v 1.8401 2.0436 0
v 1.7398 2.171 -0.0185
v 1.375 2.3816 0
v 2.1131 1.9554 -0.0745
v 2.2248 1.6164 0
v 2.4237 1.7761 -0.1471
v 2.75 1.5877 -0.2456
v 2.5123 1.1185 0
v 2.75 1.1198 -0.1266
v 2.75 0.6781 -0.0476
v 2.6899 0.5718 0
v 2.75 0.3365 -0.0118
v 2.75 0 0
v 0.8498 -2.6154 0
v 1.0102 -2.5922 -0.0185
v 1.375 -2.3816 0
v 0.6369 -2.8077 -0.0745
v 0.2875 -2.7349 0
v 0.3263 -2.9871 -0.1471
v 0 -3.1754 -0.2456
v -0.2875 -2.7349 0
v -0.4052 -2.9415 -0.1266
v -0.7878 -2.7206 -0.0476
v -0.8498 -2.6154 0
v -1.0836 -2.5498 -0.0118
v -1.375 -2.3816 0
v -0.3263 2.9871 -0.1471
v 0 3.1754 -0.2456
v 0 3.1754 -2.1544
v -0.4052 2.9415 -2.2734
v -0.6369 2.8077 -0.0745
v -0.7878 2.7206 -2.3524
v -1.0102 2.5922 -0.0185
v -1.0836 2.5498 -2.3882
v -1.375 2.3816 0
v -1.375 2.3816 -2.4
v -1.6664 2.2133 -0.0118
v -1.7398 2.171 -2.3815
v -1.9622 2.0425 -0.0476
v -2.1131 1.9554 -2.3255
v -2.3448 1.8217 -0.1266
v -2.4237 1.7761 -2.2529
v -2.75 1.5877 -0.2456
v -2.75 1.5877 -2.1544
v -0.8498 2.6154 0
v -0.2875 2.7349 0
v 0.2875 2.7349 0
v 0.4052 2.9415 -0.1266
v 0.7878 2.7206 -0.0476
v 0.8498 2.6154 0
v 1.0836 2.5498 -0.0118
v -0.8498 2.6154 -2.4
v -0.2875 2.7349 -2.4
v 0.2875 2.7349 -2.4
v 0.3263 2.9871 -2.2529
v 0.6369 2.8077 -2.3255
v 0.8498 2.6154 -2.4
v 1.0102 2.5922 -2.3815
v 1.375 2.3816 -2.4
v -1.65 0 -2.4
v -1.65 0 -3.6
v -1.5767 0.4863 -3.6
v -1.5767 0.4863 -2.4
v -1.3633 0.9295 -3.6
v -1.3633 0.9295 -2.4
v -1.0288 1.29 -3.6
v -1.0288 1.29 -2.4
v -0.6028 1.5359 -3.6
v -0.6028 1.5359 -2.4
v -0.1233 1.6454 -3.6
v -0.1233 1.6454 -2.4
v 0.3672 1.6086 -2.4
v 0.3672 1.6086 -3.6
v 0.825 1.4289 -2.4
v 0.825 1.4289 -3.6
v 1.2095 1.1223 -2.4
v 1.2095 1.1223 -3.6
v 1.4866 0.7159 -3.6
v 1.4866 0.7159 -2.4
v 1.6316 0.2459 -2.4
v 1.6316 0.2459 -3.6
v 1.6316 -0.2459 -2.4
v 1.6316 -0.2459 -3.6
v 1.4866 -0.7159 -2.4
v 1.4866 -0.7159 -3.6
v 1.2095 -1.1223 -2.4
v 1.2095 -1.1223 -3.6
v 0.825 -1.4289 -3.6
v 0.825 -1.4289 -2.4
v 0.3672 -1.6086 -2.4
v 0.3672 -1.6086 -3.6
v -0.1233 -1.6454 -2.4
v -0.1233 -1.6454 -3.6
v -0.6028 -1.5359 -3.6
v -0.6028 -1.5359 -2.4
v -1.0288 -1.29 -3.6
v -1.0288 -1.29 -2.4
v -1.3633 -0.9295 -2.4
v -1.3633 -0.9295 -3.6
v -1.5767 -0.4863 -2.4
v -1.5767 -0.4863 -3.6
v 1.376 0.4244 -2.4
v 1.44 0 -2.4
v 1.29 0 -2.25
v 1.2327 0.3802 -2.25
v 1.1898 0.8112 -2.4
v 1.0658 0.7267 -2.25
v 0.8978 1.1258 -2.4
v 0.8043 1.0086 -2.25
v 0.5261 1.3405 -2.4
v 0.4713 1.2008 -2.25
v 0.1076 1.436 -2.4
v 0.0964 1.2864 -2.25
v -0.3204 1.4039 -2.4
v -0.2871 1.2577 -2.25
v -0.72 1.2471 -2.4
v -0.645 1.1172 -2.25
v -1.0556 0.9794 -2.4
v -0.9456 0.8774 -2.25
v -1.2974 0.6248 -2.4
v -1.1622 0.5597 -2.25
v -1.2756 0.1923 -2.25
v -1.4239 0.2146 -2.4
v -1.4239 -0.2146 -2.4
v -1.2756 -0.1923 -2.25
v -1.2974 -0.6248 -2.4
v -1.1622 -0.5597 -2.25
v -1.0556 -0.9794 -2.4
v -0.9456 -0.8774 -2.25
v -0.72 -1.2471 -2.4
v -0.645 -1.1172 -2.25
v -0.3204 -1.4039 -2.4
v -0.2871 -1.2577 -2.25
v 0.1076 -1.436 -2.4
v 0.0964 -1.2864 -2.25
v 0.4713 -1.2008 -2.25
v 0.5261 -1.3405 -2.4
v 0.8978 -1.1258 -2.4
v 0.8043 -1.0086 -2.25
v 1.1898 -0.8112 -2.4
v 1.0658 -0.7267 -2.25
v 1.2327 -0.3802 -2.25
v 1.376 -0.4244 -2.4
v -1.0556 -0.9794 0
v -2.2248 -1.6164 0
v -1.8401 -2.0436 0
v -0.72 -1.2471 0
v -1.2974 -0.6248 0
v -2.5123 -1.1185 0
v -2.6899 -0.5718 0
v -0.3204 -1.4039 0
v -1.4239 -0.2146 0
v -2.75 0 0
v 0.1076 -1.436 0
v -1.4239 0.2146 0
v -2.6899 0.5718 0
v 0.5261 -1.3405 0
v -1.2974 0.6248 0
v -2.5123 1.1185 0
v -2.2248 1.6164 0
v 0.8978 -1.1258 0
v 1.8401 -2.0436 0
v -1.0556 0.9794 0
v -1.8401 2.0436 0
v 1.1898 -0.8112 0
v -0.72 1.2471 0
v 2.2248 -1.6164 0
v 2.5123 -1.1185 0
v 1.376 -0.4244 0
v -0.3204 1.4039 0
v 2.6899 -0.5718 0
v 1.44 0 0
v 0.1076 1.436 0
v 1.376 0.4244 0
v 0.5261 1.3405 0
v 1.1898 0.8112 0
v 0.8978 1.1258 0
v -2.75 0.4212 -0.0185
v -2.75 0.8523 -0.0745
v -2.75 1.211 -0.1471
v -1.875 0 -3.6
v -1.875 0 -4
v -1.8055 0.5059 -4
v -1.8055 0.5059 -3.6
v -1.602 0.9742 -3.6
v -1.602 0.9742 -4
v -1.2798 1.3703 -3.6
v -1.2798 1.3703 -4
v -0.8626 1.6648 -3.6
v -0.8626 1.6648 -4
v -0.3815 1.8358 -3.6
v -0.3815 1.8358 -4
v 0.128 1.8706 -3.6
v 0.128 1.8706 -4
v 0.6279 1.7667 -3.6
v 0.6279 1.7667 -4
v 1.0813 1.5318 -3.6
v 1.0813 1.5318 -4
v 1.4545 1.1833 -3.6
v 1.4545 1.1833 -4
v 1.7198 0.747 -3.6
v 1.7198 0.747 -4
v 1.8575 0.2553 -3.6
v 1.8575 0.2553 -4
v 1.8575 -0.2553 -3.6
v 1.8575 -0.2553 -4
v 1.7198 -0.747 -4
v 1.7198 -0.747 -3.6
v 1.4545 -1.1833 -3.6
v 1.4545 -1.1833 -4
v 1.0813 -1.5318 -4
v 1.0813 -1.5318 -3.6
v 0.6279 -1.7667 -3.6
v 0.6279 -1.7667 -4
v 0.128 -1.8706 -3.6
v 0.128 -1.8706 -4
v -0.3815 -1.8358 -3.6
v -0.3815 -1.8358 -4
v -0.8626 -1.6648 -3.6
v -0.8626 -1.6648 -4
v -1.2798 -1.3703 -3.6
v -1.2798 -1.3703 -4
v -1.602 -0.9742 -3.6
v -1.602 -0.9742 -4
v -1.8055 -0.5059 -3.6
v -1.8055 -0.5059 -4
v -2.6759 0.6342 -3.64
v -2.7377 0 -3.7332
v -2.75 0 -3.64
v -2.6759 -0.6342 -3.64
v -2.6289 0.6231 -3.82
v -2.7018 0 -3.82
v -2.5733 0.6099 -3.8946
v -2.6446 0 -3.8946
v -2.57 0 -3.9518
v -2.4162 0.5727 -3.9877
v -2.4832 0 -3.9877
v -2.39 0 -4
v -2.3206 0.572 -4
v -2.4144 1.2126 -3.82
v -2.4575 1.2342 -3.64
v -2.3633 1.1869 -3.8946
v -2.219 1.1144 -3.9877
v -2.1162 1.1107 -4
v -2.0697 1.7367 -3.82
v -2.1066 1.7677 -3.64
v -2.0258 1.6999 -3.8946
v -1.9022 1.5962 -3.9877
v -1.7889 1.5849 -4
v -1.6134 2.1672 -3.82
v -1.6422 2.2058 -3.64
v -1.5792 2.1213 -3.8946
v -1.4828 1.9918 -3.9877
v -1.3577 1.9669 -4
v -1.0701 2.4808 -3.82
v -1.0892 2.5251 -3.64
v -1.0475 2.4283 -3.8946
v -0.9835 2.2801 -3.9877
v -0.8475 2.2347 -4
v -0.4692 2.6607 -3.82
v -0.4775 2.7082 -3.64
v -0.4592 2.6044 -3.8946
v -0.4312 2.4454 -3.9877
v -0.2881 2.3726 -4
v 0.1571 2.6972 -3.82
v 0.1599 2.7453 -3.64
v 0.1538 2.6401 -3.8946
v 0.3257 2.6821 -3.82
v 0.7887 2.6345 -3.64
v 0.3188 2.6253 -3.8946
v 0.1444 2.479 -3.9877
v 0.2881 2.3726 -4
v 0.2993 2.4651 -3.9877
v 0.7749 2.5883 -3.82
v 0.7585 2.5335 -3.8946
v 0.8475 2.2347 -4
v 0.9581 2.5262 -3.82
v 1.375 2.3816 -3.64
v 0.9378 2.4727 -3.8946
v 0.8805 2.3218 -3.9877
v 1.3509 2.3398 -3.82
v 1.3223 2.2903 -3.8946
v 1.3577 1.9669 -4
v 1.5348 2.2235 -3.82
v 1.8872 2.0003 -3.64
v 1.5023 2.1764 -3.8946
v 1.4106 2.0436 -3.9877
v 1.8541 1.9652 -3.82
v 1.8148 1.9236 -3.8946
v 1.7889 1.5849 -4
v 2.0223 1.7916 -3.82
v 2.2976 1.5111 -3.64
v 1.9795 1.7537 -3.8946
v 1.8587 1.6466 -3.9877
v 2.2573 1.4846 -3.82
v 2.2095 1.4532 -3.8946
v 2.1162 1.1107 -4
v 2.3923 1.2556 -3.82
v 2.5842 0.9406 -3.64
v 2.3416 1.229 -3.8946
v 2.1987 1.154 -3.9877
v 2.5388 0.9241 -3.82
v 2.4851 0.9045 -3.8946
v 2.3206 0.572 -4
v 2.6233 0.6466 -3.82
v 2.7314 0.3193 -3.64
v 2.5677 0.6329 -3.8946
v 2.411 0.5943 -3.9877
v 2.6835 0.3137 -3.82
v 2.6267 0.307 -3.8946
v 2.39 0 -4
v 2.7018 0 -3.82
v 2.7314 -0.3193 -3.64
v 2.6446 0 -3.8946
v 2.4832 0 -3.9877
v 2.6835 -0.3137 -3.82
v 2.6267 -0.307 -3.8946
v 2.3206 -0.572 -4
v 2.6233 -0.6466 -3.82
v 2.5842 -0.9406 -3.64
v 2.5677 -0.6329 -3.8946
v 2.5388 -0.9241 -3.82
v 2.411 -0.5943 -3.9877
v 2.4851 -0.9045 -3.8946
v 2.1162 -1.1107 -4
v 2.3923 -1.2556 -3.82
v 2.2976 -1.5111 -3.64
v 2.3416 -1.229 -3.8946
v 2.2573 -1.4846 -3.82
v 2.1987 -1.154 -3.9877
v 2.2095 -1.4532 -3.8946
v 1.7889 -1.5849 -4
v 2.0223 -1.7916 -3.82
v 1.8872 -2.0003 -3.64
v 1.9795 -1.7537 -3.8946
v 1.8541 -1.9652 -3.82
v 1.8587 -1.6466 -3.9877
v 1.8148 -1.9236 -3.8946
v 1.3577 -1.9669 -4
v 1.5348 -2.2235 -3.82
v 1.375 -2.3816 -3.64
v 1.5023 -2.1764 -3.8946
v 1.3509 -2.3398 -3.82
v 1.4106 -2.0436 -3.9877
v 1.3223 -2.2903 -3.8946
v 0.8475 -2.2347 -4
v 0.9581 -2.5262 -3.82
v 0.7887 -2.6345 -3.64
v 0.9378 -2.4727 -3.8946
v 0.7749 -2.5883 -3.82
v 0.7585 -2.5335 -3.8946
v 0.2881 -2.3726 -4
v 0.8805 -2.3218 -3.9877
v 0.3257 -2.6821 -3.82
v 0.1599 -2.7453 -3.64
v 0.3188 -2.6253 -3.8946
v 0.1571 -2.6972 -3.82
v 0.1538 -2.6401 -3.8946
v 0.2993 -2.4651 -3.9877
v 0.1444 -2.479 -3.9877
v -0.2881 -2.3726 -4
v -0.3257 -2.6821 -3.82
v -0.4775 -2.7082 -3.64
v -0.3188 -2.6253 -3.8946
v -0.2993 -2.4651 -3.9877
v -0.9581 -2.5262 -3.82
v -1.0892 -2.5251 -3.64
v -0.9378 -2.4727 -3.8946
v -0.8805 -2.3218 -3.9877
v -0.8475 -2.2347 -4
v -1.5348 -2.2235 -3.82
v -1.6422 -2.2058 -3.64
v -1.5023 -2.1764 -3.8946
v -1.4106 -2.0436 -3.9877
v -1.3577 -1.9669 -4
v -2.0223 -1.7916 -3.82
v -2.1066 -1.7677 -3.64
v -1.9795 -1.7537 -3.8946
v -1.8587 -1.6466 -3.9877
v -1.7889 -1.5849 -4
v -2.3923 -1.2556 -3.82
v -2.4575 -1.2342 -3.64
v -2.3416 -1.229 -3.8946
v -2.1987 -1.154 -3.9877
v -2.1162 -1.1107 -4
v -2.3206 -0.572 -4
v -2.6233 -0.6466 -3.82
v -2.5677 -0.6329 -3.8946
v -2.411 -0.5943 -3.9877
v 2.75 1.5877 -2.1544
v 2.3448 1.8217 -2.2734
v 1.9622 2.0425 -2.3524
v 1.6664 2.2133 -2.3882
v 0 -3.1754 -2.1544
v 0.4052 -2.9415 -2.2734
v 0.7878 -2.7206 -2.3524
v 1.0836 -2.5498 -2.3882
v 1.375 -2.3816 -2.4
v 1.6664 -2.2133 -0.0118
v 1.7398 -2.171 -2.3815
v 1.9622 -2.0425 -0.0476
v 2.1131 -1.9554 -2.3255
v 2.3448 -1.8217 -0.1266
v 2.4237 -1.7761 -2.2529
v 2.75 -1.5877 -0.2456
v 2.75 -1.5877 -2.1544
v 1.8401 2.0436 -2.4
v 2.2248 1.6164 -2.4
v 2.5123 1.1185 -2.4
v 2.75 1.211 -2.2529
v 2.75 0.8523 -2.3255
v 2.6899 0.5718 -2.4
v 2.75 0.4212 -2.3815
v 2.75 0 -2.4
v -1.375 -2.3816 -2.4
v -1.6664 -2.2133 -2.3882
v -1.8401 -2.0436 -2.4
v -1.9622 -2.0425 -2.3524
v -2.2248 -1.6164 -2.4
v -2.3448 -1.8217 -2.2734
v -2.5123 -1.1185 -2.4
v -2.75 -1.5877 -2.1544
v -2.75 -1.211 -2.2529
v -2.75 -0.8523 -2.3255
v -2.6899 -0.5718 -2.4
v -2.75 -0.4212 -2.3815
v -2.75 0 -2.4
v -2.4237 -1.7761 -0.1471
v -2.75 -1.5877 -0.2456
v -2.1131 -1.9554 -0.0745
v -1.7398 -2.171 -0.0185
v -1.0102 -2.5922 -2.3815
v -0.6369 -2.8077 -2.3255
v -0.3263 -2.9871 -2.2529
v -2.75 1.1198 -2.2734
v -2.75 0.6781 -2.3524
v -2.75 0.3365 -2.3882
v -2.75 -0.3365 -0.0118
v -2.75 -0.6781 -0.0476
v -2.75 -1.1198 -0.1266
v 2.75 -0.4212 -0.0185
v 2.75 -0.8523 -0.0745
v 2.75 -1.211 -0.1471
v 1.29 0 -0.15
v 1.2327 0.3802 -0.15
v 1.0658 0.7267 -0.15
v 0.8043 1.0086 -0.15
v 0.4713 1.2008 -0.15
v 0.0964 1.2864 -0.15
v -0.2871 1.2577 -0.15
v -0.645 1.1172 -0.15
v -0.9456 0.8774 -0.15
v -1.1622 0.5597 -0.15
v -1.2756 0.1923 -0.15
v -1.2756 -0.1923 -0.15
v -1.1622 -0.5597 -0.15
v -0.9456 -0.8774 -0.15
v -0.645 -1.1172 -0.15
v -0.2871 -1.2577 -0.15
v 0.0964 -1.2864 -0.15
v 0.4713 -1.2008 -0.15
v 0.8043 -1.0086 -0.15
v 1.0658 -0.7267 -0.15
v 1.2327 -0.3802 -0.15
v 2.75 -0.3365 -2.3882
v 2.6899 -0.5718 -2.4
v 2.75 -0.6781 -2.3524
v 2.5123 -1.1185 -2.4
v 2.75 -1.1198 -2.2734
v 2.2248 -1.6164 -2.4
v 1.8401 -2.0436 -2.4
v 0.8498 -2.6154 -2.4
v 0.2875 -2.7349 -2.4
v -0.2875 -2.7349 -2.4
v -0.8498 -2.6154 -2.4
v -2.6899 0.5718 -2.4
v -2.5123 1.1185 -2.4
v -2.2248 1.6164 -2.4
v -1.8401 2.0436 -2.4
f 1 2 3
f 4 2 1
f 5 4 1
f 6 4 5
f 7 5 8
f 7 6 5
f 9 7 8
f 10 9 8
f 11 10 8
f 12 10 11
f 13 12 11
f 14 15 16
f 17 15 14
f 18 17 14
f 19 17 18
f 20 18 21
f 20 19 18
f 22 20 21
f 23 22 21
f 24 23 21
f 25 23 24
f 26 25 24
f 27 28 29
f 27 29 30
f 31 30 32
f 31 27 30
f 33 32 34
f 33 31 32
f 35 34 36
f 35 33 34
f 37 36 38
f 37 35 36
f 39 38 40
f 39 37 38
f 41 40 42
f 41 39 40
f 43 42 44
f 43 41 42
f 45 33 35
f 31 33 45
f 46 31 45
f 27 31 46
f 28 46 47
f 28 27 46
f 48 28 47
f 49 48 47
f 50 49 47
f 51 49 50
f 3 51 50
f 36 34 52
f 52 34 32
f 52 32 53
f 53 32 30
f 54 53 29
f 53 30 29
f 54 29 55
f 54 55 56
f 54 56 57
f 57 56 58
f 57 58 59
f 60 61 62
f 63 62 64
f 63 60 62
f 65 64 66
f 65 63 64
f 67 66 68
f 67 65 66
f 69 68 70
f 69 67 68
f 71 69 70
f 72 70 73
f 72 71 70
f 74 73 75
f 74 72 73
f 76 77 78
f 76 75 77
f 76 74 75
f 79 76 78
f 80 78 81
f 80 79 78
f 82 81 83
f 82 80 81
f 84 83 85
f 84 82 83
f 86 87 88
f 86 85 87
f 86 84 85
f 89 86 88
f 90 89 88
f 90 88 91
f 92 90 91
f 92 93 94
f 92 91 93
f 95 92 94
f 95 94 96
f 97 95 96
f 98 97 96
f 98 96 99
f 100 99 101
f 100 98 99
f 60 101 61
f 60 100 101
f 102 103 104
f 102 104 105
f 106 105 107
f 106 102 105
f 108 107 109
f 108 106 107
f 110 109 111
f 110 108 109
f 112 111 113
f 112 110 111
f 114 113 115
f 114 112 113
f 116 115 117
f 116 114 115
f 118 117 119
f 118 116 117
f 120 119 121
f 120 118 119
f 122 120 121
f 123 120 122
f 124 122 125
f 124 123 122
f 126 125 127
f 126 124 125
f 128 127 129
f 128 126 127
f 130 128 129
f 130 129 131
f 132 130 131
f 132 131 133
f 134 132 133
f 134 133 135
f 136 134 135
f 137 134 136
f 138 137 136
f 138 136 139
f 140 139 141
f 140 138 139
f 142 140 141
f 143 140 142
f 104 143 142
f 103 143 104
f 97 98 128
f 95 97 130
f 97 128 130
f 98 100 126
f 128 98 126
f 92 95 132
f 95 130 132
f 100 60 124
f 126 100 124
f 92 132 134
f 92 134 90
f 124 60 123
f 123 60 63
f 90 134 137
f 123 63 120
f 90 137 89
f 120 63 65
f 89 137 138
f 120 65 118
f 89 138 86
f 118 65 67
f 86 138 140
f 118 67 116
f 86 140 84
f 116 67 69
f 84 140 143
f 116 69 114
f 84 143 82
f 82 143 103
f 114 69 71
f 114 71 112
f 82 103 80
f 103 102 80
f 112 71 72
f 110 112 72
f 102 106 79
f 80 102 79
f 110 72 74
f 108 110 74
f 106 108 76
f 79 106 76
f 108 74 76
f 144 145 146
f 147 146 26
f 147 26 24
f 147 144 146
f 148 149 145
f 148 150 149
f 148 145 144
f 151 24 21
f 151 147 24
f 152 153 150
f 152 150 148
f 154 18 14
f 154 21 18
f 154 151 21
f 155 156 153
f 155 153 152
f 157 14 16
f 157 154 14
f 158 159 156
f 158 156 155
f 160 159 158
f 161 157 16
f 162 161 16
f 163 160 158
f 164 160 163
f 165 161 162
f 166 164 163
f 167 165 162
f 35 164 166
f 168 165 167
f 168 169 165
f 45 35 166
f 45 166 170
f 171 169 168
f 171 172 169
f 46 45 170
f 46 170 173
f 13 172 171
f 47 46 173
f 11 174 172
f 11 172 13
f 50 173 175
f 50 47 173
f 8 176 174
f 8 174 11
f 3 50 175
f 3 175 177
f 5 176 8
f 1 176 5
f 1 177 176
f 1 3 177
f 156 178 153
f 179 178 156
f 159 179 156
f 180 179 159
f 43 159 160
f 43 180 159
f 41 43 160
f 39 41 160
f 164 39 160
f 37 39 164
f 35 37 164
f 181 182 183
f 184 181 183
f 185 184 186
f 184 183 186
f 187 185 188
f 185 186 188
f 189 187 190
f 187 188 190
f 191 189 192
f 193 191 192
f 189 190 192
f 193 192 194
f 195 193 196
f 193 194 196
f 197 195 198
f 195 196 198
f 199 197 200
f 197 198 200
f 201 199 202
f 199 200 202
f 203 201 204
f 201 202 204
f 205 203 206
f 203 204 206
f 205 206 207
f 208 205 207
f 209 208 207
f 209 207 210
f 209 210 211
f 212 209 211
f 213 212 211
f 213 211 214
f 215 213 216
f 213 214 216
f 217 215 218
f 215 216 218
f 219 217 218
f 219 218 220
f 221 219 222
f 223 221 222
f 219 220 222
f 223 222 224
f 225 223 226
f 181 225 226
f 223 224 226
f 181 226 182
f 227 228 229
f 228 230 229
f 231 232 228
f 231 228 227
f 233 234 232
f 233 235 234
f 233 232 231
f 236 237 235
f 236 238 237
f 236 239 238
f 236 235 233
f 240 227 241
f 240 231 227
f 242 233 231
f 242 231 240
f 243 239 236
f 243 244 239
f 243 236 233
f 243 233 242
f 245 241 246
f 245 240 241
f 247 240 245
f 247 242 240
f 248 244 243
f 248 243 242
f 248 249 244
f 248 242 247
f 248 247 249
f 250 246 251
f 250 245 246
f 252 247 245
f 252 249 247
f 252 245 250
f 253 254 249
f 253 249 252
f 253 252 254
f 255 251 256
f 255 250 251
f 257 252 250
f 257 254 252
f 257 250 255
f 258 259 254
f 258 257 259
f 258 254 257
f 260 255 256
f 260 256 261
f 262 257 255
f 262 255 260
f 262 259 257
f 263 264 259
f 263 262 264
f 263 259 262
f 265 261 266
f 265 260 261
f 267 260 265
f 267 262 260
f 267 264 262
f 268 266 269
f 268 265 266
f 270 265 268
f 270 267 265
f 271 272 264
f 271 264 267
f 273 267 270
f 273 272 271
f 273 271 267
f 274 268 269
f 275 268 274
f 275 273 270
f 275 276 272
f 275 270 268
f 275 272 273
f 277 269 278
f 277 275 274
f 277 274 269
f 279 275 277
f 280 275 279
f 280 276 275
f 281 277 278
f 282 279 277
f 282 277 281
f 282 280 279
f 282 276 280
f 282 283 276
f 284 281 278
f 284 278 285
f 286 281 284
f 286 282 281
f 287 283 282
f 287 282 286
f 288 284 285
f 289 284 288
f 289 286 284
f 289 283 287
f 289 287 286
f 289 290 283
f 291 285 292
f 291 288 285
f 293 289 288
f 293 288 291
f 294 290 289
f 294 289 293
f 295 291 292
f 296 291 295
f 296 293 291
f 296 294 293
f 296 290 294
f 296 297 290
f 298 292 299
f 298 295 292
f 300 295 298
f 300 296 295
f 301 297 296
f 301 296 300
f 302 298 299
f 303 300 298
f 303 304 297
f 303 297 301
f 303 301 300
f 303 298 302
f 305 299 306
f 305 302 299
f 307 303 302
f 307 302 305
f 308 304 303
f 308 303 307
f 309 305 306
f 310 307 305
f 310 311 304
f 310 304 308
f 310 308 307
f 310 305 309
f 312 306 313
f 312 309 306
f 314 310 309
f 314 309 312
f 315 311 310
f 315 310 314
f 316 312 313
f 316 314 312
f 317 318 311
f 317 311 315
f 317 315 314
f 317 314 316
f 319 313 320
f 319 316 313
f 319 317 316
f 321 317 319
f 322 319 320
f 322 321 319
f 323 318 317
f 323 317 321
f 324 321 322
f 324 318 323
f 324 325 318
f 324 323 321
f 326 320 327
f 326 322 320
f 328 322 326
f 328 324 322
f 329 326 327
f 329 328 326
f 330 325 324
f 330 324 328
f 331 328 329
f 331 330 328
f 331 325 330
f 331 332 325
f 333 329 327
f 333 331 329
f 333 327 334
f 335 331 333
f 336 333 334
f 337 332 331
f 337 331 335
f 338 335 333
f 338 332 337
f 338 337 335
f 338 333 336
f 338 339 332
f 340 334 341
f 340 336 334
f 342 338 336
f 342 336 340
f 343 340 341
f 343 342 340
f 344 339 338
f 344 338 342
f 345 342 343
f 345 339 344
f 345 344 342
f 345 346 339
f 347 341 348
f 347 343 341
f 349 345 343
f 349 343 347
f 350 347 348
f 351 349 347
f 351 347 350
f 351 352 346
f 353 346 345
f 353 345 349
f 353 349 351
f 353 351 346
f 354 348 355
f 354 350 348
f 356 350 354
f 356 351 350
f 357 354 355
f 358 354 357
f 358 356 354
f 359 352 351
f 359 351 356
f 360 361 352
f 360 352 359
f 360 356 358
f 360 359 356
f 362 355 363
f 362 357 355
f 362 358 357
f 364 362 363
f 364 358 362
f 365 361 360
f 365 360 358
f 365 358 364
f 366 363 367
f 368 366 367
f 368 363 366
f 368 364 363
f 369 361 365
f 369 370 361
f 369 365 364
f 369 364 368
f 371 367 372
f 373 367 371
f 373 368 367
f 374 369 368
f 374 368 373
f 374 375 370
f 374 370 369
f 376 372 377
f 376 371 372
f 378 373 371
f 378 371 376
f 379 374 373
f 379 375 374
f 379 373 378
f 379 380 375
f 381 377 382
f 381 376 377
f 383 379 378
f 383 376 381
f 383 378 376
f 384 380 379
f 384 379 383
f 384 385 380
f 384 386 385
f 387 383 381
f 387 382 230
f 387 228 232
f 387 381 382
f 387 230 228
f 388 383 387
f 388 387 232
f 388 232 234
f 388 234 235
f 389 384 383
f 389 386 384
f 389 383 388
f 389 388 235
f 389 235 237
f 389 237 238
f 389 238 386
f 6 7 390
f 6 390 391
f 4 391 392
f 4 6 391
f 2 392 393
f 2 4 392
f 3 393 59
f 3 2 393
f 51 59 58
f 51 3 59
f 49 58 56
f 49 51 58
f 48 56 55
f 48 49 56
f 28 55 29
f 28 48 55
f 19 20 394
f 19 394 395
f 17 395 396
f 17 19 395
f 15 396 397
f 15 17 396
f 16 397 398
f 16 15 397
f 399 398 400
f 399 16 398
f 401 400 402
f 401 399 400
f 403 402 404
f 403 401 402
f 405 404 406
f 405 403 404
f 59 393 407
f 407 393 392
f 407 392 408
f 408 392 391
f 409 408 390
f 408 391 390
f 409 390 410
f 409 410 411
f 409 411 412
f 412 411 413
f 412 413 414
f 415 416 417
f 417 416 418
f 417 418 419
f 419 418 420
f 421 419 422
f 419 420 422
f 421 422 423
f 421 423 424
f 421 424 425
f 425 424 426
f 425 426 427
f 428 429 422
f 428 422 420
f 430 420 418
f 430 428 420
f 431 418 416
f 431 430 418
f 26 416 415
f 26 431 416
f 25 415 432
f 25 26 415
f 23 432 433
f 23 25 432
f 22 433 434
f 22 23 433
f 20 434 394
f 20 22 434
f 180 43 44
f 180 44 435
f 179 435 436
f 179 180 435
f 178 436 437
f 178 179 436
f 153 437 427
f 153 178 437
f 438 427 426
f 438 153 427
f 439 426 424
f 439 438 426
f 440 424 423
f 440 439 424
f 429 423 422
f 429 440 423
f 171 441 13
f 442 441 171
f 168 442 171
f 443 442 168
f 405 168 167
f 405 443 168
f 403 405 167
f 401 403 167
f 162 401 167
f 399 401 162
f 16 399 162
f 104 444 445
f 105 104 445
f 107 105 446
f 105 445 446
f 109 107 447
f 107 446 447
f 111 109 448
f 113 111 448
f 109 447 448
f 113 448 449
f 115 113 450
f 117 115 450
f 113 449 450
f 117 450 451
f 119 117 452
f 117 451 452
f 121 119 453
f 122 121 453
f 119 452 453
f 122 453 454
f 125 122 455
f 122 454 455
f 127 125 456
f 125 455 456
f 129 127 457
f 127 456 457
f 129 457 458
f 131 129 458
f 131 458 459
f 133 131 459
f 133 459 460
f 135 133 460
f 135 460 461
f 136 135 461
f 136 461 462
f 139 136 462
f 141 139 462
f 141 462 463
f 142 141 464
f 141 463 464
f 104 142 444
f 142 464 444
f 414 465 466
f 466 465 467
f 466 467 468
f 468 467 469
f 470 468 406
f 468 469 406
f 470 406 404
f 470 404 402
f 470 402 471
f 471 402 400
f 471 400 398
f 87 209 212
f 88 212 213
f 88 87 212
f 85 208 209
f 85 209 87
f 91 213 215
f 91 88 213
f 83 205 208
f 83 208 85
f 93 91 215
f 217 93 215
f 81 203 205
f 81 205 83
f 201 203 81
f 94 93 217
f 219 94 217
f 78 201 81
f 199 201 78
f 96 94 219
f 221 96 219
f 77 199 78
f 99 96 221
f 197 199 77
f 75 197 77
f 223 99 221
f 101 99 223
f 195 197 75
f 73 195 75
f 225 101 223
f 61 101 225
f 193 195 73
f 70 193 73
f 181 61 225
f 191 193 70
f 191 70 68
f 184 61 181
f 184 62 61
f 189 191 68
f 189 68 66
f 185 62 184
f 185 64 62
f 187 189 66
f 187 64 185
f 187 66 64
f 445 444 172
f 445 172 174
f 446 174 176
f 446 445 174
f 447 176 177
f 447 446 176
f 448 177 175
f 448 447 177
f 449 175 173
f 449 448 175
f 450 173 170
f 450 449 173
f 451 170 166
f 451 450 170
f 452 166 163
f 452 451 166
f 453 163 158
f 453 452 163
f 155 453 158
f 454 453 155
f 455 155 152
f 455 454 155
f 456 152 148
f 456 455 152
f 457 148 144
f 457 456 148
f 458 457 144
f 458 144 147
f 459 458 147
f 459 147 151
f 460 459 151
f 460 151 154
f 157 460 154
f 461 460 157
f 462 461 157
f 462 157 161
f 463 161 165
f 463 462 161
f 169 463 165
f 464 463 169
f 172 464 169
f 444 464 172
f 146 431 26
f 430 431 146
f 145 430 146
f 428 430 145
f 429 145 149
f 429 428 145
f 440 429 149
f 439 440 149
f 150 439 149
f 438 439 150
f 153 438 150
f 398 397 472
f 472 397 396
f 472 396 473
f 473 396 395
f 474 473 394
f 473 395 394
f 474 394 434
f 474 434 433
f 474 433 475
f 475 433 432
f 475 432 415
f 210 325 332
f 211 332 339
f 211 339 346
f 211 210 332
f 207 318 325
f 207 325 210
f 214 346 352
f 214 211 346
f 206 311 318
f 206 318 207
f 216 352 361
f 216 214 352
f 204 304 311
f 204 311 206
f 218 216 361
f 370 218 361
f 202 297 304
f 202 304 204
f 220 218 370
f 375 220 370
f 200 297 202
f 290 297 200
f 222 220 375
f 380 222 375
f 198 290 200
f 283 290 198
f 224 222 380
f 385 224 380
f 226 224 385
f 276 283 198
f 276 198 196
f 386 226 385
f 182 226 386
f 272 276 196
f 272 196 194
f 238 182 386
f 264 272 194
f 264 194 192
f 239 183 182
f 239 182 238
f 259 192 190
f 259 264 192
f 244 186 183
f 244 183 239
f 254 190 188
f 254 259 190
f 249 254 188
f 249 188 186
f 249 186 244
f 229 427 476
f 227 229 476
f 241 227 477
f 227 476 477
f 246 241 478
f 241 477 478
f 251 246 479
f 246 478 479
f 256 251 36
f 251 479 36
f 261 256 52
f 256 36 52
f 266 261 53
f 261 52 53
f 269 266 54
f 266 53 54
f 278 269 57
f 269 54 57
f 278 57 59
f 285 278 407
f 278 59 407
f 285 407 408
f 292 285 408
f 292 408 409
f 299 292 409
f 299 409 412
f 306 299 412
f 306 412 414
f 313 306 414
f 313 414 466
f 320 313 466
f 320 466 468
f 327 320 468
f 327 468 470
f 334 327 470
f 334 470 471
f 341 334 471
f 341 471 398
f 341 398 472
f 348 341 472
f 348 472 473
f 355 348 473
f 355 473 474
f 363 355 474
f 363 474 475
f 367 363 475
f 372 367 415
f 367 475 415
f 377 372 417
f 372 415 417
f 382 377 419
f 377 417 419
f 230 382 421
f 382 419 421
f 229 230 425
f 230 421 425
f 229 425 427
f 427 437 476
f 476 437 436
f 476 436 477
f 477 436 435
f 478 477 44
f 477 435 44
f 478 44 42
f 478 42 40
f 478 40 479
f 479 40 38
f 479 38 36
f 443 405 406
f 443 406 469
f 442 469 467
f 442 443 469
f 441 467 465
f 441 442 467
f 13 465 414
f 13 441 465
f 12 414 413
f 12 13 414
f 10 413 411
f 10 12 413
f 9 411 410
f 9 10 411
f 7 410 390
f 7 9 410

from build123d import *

# Parameters (mm, degrees)
SKETCH_1_R          = 1.29
EXTRUDE_1_DEPTH     = 2.4
SKETCH_5_R          = 2.75
SKETCH_5_R_2        = 1.65
EXTRUDE_4_DEPTH     = 1.6
FILLET_2_R          = 0.36
SKETCH_6_R          = 1.875
CUT_EXTRUDE_1_DEPTH = 0.4
CHAMFER_2_SIZE      = 0.15


with BuildPart() as part:
    # 草图1 → 凸台-拉伸1 (new body)
    with BuildSketch(Plane.XY):
        Polygon((0, 3.175426481), (-2.75, 1.58771324), (-2.75, -1.58771324), (0, -3.175426481), (2.75, -1.58771324), (2.75, 1.58771324), align=None)
        Circle(SKETCH_1_R, mode=Mode.SUBTRACT)
    extrude(amount=-EXTRUDE_1_DEPTH)

    # 草图2 → 切除-旋转1 (revolve, cut)
    with BuildSketch(Plane(origin=(0, 0, 0), x_dir=(0, 0, -1), z_dir=(1, 0, 0))):
        Polygon((0, 2.75), (0.245620093, 3.175426481), (0, 3.175426481), align=None)
        Polygon((2.4, 2.75), (2.154379907, 3.175426481), (2.4, 3.175426481), align=None)
    revolve(axis=Axis((0, 0, 0), (0, 0, -1)), mode=Mode.SUBTRACT)

    # 草图5 → 凸台-拉伸4 (add)
    with BuildSketch(Plane(origin=(0, 0, -2.4), x_dir=(-1, 0, 0), z_dir=(0, 0, -1))):
        Circle(SKETCH_5_R)
        Circle(SKETCH_5_R_2, mode=Mode.SUBTRACT)
    extrude(amount=EXTRUDE_4_DEPTH)

    # 圆角2
    fillet_2_edges = [part.edges().sort_by_distance(p)[0] for p in [
        (2.75, 0, -4),
    ]]
    fillet(fillet_2_edges, radius=FILLET_2_R)

    # 草图6 → 切除-拉伸1 (cut)
    with BuildSketch(Plane(origin=(0, 0, -4), x_dir=(-1, 0, 0), z_dir=(0, 0, -1))):
        Circle(SKETCH_6_R)
    extrude(amount=-CUT_EXTRUDE_1_DEPTH, mode=Mode.SUBTRACT)

    # 倒角2
    chamfer_2_edges = [part.edges().sort_by_distance(p)[0] for p in [
        (-1.29, 0, -2.4),
        (-1.29, 0, 0),
    ]]
    chamfer(chamfer_2_edges, length=CHAMFER_2_SIZE)


solid = part.part
